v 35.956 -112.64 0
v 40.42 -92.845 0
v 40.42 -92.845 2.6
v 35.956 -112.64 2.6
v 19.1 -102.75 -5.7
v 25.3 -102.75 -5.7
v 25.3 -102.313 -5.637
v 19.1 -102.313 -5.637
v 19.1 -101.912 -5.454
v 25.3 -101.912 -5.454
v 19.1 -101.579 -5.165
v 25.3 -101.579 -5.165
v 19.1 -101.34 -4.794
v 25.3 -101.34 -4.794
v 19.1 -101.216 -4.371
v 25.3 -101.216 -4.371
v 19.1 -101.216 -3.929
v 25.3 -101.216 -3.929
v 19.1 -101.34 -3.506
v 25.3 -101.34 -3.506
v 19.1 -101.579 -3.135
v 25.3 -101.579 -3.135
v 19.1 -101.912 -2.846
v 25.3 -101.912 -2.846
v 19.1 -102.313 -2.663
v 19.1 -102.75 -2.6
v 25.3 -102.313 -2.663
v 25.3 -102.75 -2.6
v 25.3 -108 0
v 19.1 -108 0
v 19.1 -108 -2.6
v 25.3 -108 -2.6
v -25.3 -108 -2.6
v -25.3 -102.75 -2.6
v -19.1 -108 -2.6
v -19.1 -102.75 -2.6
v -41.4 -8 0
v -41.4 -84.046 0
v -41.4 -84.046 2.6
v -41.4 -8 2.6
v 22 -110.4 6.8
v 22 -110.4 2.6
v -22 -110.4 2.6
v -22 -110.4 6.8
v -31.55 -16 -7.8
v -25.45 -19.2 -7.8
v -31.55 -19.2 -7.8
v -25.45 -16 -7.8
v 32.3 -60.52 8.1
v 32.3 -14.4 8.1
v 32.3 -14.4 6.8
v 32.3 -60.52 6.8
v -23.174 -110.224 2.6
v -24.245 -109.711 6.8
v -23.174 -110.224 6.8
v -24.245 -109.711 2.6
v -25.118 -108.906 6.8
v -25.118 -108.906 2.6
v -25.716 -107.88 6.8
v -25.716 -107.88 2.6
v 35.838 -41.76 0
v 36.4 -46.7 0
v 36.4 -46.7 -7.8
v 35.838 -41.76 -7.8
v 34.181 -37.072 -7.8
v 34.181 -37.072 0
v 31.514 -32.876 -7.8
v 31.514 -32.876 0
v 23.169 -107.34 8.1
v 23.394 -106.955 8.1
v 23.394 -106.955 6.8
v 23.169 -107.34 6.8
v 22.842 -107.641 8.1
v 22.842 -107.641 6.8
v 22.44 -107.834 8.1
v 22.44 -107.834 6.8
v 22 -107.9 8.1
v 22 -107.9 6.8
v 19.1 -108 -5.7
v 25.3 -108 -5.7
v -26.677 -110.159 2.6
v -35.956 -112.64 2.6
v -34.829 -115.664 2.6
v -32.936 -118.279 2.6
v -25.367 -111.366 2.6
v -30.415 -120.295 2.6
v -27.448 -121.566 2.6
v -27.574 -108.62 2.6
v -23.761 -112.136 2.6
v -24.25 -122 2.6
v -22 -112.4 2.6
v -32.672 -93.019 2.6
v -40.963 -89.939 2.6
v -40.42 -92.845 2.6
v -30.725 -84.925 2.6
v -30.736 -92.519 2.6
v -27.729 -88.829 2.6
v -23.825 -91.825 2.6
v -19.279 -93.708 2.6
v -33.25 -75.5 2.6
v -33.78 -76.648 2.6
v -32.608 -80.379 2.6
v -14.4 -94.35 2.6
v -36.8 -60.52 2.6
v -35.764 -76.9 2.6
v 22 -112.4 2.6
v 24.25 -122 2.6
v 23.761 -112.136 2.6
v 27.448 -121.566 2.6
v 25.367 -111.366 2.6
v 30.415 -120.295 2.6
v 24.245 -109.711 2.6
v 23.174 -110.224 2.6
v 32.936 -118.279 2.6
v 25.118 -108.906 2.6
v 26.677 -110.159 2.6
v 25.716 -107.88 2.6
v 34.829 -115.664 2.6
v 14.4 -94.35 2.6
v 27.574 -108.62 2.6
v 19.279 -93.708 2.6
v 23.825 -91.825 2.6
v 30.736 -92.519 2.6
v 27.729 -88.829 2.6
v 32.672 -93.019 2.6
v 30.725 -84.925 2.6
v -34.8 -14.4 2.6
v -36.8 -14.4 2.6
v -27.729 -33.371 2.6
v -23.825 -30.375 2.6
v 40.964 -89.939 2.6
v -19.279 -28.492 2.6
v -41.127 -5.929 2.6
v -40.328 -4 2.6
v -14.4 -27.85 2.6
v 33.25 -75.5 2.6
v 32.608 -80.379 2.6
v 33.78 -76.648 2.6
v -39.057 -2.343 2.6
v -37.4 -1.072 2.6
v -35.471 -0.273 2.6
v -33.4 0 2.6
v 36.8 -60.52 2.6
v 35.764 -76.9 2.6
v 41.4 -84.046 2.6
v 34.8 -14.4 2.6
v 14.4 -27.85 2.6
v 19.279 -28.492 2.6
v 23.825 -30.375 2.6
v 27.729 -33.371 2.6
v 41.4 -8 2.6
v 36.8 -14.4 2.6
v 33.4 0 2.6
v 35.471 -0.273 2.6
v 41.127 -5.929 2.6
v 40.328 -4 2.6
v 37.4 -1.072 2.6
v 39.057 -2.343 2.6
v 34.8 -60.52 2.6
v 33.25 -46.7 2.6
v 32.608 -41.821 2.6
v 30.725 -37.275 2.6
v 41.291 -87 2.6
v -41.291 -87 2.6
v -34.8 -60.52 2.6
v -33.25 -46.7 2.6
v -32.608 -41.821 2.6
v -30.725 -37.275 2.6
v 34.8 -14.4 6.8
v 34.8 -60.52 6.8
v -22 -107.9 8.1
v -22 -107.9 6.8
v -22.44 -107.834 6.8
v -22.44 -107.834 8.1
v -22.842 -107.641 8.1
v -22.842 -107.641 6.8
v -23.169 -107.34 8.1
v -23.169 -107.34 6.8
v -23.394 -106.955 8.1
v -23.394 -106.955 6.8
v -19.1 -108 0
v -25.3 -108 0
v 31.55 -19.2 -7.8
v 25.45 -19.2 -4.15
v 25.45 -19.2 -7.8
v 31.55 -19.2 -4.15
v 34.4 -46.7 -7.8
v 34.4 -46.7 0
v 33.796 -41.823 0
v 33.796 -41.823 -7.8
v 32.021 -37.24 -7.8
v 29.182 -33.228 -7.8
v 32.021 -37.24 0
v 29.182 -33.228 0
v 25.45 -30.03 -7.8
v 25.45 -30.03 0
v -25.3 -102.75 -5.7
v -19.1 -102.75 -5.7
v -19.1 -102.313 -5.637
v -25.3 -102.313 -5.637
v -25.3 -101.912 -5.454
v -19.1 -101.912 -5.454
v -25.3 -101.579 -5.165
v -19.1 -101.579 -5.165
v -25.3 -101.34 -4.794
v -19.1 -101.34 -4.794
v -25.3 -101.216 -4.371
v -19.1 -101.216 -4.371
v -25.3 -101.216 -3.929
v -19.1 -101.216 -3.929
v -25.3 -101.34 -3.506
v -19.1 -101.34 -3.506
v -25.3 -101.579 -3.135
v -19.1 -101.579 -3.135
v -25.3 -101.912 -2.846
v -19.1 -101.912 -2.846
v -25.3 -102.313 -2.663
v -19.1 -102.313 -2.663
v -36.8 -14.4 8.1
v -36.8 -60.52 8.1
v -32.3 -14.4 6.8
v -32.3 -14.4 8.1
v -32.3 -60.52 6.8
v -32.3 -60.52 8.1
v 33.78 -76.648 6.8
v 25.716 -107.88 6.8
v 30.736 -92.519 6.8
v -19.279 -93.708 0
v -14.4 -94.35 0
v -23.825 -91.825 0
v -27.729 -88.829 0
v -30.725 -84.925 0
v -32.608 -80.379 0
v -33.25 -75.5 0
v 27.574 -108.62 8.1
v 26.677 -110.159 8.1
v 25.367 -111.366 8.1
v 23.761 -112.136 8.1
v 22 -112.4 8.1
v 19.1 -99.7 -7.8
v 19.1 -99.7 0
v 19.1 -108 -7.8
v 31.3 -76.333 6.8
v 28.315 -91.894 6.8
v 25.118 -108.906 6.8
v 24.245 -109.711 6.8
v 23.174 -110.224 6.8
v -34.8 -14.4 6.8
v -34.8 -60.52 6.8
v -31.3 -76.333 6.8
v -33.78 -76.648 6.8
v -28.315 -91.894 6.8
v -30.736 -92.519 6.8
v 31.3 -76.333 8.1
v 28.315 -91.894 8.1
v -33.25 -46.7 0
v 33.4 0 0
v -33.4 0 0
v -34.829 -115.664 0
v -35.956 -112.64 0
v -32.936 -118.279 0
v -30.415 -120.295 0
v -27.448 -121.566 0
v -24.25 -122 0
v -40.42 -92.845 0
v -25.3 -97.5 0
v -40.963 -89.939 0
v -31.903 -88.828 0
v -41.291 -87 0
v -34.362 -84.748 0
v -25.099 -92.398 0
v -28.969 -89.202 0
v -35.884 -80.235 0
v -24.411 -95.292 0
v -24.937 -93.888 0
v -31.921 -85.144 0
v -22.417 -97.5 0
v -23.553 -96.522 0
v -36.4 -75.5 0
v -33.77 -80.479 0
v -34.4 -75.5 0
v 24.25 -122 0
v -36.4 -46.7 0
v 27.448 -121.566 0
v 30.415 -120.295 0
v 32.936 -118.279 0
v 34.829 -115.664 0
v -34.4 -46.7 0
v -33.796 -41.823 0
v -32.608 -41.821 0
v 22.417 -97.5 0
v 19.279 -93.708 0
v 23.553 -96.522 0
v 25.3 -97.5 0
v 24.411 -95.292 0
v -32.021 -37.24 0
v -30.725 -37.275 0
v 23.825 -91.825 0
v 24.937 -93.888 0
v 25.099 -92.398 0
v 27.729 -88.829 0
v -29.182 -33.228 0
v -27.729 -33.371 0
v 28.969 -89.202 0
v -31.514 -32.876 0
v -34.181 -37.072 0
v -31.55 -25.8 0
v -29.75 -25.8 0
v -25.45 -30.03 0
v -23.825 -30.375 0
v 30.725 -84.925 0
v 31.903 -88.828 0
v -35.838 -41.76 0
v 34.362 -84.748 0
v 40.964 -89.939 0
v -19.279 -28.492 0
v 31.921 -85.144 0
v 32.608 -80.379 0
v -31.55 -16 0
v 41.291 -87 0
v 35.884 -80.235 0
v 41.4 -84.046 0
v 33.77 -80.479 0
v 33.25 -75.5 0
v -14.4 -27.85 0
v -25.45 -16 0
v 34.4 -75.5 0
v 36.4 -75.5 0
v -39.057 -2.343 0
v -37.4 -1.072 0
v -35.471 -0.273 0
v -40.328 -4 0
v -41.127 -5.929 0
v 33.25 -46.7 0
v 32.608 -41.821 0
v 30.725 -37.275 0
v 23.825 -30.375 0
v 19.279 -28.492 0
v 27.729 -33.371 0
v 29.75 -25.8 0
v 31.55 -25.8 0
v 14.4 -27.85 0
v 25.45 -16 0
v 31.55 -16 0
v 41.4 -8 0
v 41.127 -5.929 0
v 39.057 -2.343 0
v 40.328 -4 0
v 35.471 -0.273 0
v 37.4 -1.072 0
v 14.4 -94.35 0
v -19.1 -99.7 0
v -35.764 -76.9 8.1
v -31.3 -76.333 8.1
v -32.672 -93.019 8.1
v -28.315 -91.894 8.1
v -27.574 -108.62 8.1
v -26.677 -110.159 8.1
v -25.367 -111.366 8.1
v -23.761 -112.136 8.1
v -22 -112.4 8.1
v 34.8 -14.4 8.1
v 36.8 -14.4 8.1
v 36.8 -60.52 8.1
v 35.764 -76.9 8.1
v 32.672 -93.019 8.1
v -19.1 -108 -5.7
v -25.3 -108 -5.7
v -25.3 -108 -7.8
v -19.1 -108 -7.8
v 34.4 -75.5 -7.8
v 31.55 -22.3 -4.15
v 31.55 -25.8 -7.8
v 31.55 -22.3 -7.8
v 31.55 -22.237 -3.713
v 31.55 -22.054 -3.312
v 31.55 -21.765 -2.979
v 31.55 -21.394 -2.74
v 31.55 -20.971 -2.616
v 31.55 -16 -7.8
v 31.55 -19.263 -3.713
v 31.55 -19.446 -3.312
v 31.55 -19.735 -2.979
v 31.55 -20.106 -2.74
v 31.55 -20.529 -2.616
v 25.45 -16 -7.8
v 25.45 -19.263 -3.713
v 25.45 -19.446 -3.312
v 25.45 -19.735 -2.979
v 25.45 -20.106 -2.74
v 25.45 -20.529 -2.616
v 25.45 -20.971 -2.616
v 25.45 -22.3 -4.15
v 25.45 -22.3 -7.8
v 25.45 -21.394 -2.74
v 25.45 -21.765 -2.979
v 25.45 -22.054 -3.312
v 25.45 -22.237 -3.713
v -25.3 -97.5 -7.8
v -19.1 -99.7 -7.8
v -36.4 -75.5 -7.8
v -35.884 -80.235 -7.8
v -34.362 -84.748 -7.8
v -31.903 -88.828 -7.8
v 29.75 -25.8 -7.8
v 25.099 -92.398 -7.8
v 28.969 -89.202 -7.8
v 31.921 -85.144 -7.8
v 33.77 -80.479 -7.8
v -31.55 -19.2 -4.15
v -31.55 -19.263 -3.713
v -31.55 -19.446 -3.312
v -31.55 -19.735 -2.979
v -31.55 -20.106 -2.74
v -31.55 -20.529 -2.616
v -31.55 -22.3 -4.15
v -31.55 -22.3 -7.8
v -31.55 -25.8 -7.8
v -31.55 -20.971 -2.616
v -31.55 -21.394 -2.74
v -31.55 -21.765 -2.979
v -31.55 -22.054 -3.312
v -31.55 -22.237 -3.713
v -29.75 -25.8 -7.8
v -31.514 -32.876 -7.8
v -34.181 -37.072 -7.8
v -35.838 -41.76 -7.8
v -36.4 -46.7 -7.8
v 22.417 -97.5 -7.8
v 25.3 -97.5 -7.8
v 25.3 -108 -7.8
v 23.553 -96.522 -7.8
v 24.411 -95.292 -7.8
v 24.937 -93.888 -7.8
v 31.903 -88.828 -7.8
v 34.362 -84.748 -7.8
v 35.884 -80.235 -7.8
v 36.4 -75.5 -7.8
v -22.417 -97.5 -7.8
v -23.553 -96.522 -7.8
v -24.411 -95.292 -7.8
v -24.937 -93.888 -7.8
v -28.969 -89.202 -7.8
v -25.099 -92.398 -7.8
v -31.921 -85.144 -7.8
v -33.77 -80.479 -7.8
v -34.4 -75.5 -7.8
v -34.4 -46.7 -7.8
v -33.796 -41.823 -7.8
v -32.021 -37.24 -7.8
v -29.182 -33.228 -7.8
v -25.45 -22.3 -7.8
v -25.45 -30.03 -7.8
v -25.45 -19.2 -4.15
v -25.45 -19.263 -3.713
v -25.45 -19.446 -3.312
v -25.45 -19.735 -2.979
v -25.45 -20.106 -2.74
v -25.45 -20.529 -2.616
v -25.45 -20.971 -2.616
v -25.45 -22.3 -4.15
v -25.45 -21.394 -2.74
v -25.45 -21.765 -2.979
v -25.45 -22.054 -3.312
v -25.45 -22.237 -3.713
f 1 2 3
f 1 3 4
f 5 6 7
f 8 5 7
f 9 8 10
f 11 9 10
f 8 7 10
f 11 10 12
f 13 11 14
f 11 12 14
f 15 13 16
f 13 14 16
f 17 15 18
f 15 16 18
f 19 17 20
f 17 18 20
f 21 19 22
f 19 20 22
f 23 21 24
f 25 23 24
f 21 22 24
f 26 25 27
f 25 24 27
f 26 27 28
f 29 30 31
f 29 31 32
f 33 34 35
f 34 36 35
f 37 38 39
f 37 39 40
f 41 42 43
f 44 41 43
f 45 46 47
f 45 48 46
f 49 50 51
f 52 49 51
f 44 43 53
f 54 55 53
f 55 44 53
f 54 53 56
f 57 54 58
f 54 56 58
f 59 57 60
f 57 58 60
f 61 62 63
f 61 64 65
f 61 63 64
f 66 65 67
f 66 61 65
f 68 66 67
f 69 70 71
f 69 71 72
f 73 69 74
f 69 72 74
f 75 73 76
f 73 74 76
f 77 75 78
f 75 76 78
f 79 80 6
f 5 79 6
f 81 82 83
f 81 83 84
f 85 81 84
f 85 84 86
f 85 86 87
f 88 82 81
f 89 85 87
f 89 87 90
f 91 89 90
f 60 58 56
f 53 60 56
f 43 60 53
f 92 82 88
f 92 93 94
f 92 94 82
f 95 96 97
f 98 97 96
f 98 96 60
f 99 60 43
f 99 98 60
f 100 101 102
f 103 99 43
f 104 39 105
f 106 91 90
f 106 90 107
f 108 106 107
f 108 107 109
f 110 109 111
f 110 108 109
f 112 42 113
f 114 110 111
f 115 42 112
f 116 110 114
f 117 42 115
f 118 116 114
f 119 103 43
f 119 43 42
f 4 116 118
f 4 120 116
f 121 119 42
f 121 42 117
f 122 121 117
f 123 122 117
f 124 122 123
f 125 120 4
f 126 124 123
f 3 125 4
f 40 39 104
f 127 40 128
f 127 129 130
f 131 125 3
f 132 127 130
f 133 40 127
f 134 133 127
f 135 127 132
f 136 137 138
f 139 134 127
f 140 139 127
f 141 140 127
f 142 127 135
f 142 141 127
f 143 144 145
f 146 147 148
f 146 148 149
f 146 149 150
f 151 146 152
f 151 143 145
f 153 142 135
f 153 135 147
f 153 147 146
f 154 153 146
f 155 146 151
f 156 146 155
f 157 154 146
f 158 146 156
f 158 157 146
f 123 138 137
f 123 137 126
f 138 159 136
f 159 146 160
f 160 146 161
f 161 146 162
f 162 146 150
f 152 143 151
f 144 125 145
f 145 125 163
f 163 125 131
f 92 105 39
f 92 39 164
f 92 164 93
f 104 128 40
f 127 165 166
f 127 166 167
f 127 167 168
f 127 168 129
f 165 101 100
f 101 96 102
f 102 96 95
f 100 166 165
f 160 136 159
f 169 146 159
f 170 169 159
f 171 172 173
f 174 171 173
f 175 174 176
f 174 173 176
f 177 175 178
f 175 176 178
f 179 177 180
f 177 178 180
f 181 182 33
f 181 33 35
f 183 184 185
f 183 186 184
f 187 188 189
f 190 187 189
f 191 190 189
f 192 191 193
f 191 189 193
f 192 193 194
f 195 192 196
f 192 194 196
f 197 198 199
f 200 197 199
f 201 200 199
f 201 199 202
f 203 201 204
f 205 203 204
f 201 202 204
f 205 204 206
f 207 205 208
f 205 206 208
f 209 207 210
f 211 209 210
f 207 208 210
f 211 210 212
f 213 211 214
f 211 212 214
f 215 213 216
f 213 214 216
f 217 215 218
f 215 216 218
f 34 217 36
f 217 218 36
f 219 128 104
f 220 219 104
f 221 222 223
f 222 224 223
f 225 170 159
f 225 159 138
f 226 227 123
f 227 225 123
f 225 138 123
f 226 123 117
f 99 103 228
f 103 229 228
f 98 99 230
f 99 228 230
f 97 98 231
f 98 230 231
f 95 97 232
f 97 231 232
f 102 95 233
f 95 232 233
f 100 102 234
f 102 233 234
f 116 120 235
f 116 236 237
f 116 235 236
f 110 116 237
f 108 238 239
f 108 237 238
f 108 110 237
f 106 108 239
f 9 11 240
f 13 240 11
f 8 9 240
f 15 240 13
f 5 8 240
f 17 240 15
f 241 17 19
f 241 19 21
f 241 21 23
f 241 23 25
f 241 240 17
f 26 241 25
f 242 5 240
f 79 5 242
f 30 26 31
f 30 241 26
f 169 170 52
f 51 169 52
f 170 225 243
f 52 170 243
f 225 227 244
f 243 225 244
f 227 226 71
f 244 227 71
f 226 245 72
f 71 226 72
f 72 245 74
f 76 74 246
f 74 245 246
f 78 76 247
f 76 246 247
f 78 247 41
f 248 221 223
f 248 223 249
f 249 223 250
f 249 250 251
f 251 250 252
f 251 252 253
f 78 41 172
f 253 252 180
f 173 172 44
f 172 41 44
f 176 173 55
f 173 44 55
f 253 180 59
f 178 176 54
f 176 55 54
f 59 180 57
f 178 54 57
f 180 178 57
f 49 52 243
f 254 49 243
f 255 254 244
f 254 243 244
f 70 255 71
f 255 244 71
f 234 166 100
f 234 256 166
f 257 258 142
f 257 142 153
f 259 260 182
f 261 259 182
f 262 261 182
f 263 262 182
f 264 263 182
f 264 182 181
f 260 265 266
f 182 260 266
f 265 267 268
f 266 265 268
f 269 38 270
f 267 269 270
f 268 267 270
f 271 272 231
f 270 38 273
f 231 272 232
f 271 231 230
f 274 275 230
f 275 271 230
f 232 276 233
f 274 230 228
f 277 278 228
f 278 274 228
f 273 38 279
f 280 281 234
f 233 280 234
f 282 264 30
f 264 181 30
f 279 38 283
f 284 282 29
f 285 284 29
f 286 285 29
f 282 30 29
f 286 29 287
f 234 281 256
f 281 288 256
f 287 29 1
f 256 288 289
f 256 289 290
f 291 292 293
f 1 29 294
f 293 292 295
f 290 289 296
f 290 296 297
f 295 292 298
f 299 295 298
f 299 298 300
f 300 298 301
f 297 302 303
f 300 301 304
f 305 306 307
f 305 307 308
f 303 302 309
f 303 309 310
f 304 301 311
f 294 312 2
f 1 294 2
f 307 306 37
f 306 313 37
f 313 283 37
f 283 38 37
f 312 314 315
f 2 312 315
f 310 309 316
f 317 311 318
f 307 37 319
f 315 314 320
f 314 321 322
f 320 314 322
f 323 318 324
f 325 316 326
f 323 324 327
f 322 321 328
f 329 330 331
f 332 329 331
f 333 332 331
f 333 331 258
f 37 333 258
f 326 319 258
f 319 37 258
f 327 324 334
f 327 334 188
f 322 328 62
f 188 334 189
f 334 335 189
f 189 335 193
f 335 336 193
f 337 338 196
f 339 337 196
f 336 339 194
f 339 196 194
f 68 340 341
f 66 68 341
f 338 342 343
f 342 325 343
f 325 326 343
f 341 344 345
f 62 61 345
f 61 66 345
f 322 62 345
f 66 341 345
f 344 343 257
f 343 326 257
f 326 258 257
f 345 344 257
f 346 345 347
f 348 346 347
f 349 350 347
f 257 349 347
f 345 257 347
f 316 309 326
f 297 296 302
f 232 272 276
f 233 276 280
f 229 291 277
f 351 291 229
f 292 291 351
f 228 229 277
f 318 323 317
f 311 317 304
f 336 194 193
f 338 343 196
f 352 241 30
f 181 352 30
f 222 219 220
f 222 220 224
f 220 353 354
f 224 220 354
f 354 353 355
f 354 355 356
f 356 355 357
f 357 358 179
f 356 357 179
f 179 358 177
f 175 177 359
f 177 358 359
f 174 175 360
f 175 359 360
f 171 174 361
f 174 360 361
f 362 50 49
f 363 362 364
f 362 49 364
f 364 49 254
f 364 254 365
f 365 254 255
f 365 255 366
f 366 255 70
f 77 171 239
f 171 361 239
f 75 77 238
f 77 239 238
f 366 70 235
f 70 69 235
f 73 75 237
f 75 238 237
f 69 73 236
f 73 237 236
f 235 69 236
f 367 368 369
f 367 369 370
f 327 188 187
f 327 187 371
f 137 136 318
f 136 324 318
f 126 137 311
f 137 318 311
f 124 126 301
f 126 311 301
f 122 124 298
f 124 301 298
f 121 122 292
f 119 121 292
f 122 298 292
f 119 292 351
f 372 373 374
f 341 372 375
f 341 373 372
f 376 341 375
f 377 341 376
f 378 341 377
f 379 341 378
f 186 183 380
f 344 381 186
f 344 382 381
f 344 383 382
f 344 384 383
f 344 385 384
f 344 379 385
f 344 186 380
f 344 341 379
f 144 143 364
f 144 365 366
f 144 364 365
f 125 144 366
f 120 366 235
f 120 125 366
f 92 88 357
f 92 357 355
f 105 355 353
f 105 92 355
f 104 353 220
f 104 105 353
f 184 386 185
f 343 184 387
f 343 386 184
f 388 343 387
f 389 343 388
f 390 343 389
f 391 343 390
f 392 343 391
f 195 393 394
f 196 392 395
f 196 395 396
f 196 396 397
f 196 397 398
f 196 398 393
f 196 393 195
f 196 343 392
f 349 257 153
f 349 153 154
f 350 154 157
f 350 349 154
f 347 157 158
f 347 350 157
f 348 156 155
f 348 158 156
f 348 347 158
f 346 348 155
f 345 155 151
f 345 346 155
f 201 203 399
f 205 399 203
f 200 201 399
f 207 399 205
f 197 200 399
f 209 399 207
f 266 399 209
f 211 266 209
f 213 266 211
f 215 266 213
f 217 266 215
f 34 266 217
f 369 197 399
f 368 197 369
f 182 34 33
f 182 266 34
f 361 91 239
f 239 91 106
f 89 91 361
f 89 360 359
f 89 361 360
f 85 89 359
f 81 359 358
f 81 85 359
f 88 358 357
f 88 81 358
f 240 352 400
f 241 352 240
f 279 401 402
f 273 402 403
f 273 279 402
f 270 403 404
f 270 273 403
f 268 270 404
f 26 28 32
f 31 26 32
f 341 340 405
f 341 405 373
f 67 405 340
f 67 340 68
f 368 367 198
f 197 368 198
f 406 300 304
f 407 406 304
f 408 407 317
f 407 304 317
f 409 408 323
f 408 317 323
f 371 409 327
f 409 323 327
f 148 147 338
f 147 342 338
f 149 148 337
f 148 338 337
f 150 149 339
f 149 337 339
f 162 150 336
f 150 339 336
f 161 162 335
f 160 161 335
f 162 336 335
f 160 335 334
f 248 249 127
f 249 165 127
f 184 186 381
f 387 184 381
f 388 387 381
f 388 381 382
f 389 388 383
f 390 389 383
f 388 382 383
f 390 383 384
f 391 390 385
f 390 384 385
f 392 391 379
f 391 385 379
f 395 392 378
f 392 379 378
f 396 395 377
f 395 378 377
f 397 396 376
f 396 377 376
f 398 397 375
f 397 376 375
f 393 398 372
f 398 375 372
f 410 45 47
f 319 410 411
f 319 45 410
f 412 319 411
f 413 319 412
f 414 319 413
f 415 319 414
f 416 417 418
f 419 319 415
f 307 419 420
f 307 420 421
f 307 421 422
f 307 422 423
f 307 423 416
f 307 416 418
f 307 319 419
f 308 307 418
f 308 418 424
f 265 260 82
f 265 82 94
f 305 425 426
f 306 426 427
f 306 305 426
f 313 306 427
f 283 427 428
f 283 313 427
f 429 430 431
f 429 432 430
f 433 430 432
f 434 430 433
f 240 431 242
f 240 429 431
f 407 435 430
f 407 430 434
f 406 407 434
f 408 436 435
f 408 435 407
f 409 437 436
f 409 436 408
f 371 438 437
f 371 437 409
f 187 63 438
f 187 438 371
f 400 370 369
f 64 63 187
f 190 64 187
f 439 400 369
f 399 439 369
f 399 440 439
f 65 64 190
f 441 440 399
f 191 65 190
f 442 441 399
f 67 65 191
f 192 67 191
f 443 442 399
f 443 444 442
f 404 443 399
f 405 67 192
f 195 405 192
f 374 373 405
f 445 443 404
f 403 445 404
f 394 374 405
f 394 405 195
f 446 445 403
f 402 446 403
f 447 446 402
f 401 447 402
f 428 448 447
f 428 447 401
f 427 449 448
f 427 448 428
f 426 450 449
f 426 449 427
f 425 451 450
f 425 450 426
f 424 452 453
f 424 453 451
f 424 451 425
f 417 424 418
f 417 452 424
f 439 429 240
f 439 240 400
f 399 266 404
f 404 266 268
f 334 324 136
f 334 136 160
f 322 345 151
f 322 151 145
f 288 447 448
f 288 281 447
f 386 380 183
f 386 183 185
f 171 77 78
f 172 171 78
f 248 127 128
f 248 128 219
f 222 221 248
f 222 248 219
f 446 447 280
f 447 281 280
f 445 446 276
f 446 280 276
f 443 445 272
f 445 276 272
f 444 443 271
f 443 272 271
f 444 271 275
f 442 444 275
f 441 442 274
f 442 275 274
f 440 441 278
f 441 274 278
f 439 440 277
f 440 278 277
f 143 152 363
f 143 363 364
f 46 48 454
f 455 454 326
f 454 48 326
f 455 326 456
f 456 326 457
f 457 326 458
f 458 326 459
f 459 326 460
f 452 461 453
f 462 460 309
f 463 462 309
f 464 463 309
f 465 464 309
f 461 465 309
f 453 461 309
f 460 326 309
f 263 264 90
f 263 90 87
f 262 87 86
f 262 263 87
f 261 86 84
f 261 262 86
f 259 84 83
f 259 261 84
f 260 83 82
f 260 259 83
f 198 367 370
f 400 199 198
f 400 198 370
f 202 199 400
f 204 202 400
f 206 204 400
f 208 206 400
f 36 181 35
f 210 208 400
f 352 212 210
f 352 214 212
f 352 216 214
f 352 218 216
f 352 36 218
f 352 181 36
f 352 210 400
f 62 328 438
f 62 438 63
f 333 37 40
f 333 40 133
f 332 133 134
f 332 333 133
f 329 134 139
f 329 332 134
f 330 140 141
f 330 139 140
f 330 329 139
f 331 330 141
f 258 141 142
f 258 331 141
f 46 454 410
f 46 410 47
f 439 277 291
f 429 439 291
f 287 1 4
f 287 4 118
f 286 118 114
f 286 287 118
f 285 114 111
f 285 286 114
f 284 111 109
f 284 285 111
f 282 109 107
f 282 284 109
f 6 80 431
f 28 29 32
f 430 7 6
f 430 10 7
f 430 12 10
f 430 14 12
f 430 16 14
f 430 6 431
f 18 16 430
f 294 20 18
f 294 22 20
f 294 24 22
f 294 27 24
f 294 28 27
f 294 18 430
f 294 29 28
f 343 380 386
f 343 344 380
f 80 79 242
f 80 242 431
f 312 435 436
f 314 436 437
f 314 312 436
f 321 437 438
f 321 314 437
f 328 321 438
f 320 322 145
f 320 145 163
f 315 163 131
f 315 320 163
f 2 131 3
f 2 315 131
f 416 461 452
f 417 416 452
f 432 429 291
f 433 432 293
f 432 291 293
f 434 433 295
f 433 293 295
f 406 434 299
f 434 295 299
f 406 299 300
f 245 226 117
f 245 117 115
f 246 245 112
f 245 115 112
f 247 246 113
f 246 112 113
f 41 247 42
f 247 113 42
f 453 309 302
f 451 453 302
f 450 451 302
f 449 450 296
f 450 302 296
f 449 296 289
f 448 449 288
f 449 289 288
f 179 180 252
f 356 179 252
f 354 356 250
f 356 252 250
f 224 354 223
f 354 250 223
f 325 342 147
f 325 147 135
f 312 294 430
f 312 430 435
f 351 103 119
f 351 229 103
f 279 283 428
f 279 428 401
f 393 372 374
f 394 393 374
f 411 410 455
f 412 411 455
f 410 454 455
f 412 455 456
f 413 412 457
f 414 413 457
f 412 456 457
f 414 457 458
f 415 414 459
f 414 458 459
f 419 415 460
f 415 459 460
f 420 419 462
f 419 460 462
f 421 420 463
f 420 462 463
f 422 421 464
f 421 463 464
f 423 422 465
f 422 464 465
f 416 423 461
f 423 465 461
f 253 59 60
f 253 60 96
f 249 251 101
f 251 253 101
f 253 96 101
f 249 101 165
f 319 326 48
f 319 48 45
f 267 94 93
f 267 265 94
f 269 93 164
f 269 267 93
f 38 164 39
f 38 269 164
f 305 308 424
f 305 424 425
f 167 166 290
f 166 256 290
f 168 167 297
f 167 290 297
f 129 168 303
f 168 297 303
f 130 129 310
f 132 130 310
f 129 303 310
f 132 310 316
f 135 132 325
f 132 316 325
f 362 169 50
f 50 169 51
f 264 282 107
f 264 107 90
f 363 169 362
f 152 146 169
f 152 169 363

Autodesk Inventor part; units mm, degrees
ref_plane "YZ Plane" through (0, 0, 0) normal (1, 0, 0) x (0, 1, 0)
ref_plane "XZ Plane" through (0, 0, 0) normal (0, 1, 0) x (-1, 0, 0)
ref_plane "XY Plane" through (0, 0, 0) normal (0, 0, 1) x (1, 0, 0)
sketch "Skizze1" plane through (0, 0, 0) normal (0, 0, 1) x (1, 0, 0)
  line L0 (-33.4, 0) -> (33.4, 0)
  line L1 (41.4, -8) -> (41.4, -84.0456)
  line L2 (40.4201, -92.8453) -> (35.956, -112.6399)
  line L3 (24.25, -122) -> (-24.25, -122)
  line L4 (-35.956, -112.6399) -> (-40.4201, -92.8453)
  line L5 (-41.4, -84.0456) -> (-41.4, -8)
  line L6 (0, 0) -> (0, -122) construction
  arc A0 (-41.4, -84.0456) -> (-40.4201, -92.8453) centre (-1.4, -84.0456) ccw
  arc A1 (40.4201, -92.8453) -> (41.4, -84.0456) centre (1.4, -84.0456) ccw
  arc A2 (-35.956, -112.6399) -> (-24.25, -122) centre (-24.25, -110) ccw
  arc A3 (24.25, -122) -> (35.956, -112.6399) centre (24.25, -110) ccw
  arc A4 (-33.4, 0) -> (-41.4, -8) centre (-33.4, -8) ccw
  arc A5 (41.4, -8) -> (33.4, 0) centre (33.4, -8) ccw
  point P0 (33.8452, -122)
  point P1 (-33.8452, -122)
  point P2 (-41.4, -88.5)
  dimension "d1" = 82.8
  dimension "d2" = 122
  dimension "d3" = 33.5
  dimension "d4" = 40
  dimension "d5" = 12
  dimension "d6" = 8
  dimension "d15" = 48.5
extrude "Extrusion1" add sketch "Skizze1" along normal blind 2.6
sketch "Skizze2" plane through (0, 0, 2.6) normal (0, 0, 1) x (1, 0, 0)
  line L0 (-36.8, -14.4) -> (-36.8, -60.5202)
  arc A0 (-36.8, -60.5202) -> (-27.5742, -108.62) centre (93.2, -60.5202) ccw
  line L1 (-22, -112.4) -> (22, -112.4)
  line L2 (36.8, -14.4) -> (36.8, -60.5202)
  arc A1 (27.5742, -108.62) -> (36.8, -60.5202) centre (-93.2, -60.5202) ccw
  line L3 (-36.8, -60.5202) -> (36.8, -60.5202) construction
  line L4 (-36.8, -14.4) -> (36.8, -14.4) construction
  line L5 (0, 0) -> (0, -122) construction
  line L6 (-24.25, -122) -> (24.25, -122) construction
  arc A2 (-27.5742, -108.62) -> (-22, -112.4) centre (-22, -106.4) ccw
  arc A3 (22, -112.4) -> (27.5742, -108.62) centre (22, -106.4) ccw
  line L7 (41.4, -84.0456) -> (41.4, -8) construction
  line L8 (-41.4, -8) -> (-41.4, -84.0456) construction
  line L9 (-34.8, -60.5202) -> (-34.8, -14.4)
  line L10 (34.8, -14.4) -> (34.8, -60.5202)
  arc A4 (25.7161, -107.88) -> (34.8, -60.5202) centre (-93.2, -60.5202) ccw
  arc A5 (22, -110.4) -> (25.7161, -107.88) centre (22, -106.4) ccw
  line L11 (22, -110.4) -> (-22, -110.4)
  arc A6 (-25.7161, -107.88) -> (-22, -110.4) centre (-22, -106.4) ccw
  arc A7 (-34.8, -60.5202) -> (-25.7161, -107.88) centre (93.2, -60.5202) ccw
  line L12 (-36.8, -14.4) -> (-34.8, -14.4)
  line L13 (34.8, -14.4) -> (36.8, -14.4)
  point P0 (-25.9993, -112.4)
  point P1 (25.9993, -112.4)
  point P2 (0, -14.4)
  dimension "d9" = 6
  dimension "d10" = 6
  dimension "d11" = 130
  dimension "d12" = 4.6
  dimension "d13" = 9.6
  dimension "d14" = 44
  dimension "d16" = 14.4
  dimension "d17" = 2
extrude "Extrusion2" add sketch "Skizze2" along normal blind 5.5
sketch "Skizze3" plane through (-36.8, -14.4, 2.6) normal (0, 1, 0) x (1, 0, 0)
  line L0 (2, -4.2) -> (4.5, -4.2)
  line L1 (4.5, -4.2) -> (4.5, -5.5)
  line L2 (4.5, -5.5) -> (2, -5.5)
  line L3 (2, -5.5) -> (2, -4.2)
  line L4 (0, 0) -> (0, -5.5) projected
  point P0 (36.8, 2.6)
  dimension "d20" = 4.5
  dimension "d21" = 1.3
sketch "Skizze4" plane through (0, 0, 8.1) normal (0, 0, 1) x (1, 0, 0)
  line L0 (-34.8, -60.5202) -> (-34.8, -14.4) projected
  arc A0 (-34.8, -60.5202) -> (-25.7161, -107.88) centre (93.2, -60.5202) ccw projected
  arc A1 (-25.7161, -107.88) -> (-22, -110.4) centre (-22, -106.4) ccw projected
  line L1 (22, -110.4) -> (-22, -110.4) projected
  arc A2 (22, -110.4) -> (25.7161, -107.88) centre (22, -106.4) ccw projected
  arc A3 (25.7161, -107.88) -> (34.8, -60.5202) centre (-93.2, -60.5202) ccw projected
  line L2 (34.8, -14.4) -> (34.8, -60.5202) projected
  point P0 (0, 0)
sketch3d "3D-Skizze1"
  line L0 (-34.8, -14.4, 8.1) -> (-34.8, -60.5202, 8.1)
  arc A0 (-34.8, -60.5202, 8.1) -> (-25.7161, -107.88, 8.1) centre (93.2, -60.5202, 8.1) ccw
  arc A1 (-25.7161, -107.88, 8.1) -> (-22, -110.4, 8.1) centre (-22, -106.4, 8.1) ccw
  line L1 (-22, -110.4, 8.1) -> (22, -110.4, 8.1)
  arc A2 (22, -110.4, 8.1) -> (25.7161, -107.88, 8.1) centre (22, -106.4, 8.1) ccw
  arc A3 (25.7161, -107.88, 8.1) -> (34.8, -60.5202, 8.1) centre (-93.2, -60.5202, 8.1) ccw
  line L2 (34.8, -60.5202, 8.1) -> (34.8, -14.4, 8.1)
sweep "Sweeping1" add profiles "Skizze3" path "3D-Skizze1"
sketch "Skizze5" plane through (0, 0, 0) normal (0, 0, -1) x (-1, 0, 0)
  line L0 (-36.4, -24.7) -> (36.4, -24.7)
  line L1 (36.4, -24.7) -> (36.4, -97.5)
  line L2 (36.4, -97.5) -> (-36.4, -97.5)
  line L3 (-36.4, -97.5) -> (-36.4, -24.7)
  line L4 (-36.4, -24.7) -> (36.4, -97.5) construction
  line L5 (36.4, -24.7) -> (-36.4, -97.5) construction
  circle A0 centre (14.4, -46.7) radius 22 construction
  line L6 (0, 0) -> (0, -122) construction
  line L7 (24.25, -122) -> (-24.25, -122) construction
  line L8 (34.4, -26.7) -> (-34.4, -26.7)
  line L9 (-34.4, -26.7) -> (-34.4, -95.5)
  line L10 (-34.4, -95.5) -> (34.4, -95.5)
  line L11 (34.4, -95.5) -> (34.4, -26.7)
  line L12 (34.4, -26.7) -> (-34.4, -95.5) construction
  line L13 (-34.4, -26.7) -> (34.4, -95.5) construction
  circle A1 centre (-14.4, -46.7) radius 22 construction
  circle A2 centre (-14.4, -75.5) radius 22 construction
  circle A3 centre (14.4, -75.5) radius 22 construction
  line L14 (41.4, -8) -> (41.4, -84.0456) construction
  arc A4 (-36.4, -75.5) -> (-14.4, -97.5) centre (-14.4, -75.5) ccw
  arc A5 (-14.4, -24.7) -> (-36.4, -46.7) centre (-14.4, -46.7) ccw
  arc A6 (36.4, -46.7) -> (14.4, -24.7) centre (14.4, -46.7) ccw
  arc A7 (14.4, -97.5) -> (36.4, -75.5) centre (14.4, -75.5) ccw
  line L15 (-25.3, -97.5) -> (-19.1, -97.5)
  line L16 (-19.1, -97.5) -> (-19.1, -108)
  line L17 (-19.1, -108) -> (-25.3, -108)
  line L18 (-25.3, -108) -> (-25.3, -97.5)
  line L19 (19.1, -97.5) -> (25.3, -97.5)
  line L20 (25.3, -97.5) -> (25.3, -108)
  line L21 (25.3, -108) -> (19.1, -108)
  line L22 (19.1, -108) -> (19.1, -97.5)
  line L23 (-19.1, -108) -> (19.1, -108) construction
  arc A8 (-14.4, -26.7) -> (-34.4, -46.7) centre (-14.4, -46.7) ccw
  arc A9 (34.4, -46.7) -> (14.4, -26.7) centre (14.4, -46.7) ccw
  arc A10 (14.4, -95.5) -> (34.4, -75.5) centre (14.4, -75.5) ccw
  arc A11 (-34.4, -75.5) -> (-14.4, -95.5) centre (-14.4, -75.5) ccw
  line L24 (-25.3, -97.5) -> (-31.9034, -88.8279)
  line L25 (25.3, -97.5) -> (31.9034, -88.8279)
  line L26 (-19.1, -98.5) -> (19.1, -98.5)
  line L27 (19.1, -98.5) -> (19.1, -99.7)
  line L28 (19.1, -99.7) -> (-19.1, -99.7)
  line L29 (-19.1, -99.7) -> (-19.1, -98.5)
  arc A12 (-25.0991, -92.3976) -> (-19.1, -98.5) centre (-19.1, -92.5) ccw
  arc A13 (19.1, -98.5) -> (25.0991, -92.3976) centre (19.1, -92.5) ccw
  line L30 (-31.55, -16) -> (-25.45, -16)
  line L31 (-25.45, -16) -> (-25.45, -25.8)
  line L32 (-25.45, -25.8) -> (-31.55, -25.8)
  line L33 (-31.55, -25.8) -> (-31.55, -16)
  line L34 (25.45, -16) -> (31.55, -16)
  line L35 (31.55, -16) -> (31.55, -25.8)
  line L36 (31.55, -25.8) -> (25.45, -25.8)
  line L37 (25.45, -25.8) -> (25.45, -16)
  line L38 (-25.45, -16) -> (25.45, -16) construction
  line L39 (-29.75, -25.8) -> (-31.5142, -32.876)
  line L40 (29.75, -25.8) -> (31.5142, -32.876)
  line L41 (-29.75, -25.8) -> (-29.75, -30.94) construction
  line L42 (29.75, -25.8) -> (29.75, -30.94) construction
  line L43 (-25.45, -25.8) -> (-25.45, -30.0297)
  line L44 (25.45, -25.8) -> (25.45, -30.0297)
  line L45 (-33.25, -27.85) -> (33.25, -27.85)
  line L46 (33.25, -27.85) -> (33.25, -94.35)
  line L47 (33.25, -94.35) -> (-33.25, -94.35)
  line L48 (-33.25, -94.35) -> (-33.25, -27.85)
  line L49 (-33.25, -27.85) -> (33.25, -94.35) construction
  line L50 (33.25, -27.85) -> (-33.25, -94.35) construction
  circle A14 centre (-14.4, -75.5) radius 18.85
  circle A15 centre (-14.4, -46.7) radius 18.85
  circle A16 centre (14.4, -46.7) radius 18.85
  circle A17 centre (14.4, -75.5) radius 18.85
  point P0 (0, -61.1)
  point P1 (0, -24.7)
  point P2 (0, -108)
  point P3 (0, -16)
  point P4 (34.4, -46.7)
  point P5 (34.4, -75.5)
  point P6 (22.4166, -97.5)
  point P7 (-22.4166, -97.5)
  point P8 (-34.4, -75.5)
  point P9 (-34.4, -46.7)
  point P10 (-33.25, -40.0159)
  point P11 (-33.25, -82.1841)
  point P12 (-21.0841, -94.35)
  point P13 (21.0841, -94.35)
  point P14 (33.25, -82.1841)
  point P15 (33.25, -40.0159)
  point P16 (21.0841, -27.85)
  point P17 (-21.0841, -27.85)
  point P18 (14.4, -27.85)
  point P19 (-14.4, -27.85)
  point P20 (-33.25, -46.7)
  point P21 (-33.25, -75.5)
  point P22 (-14.4, -94.35)
  point P23 (14.4, -94.35)
  point P24 (33.25, -75.5)
  point P25 (33.25, -46.7)
  dimension "d25" = 2
  dimension "d26" = 22
  dimension "d27" = 5
  dimension "d29" = 6.2
  dimension "d30" = 6.2
  dimension "d31" = 38.2
  dimension "d33" = 1.2
  dimension "d34" = 3
  dimension "d35" = 6
  dimension "d36" = 6
  dimension "d37" = 63.1
  dimension "d38" = 6.1
  dimension "d39" = 6.1
  dimension "d40" = 92
  dimension "d41" = 9.8
  dimension "d42" = 37.287
  dimension "d44" = 1.8
  dimension "d45" = 1.8
  dimension "d46" = 14
  dimension "d79" = 66.5
  dimension "d80" = 66.5
  dimension "d83" = 22.3
  dimension "d84" = 14
extrude "Extrusion3" add sketch "Skizze5" along normal blind 7.8 contours L31 L32 L33 L0 | L0 L33 L30 L31 | L37 L34 L35 L0 | L0 L35 L36 L37 | L43 L8 L39 L32 | L43 A5 L45 L39 L8 | L43 L45 A5 | L36 L40 L8 L44 | L8 L40 L45 A6 L44 | A6 L45 L44 | L45 L43 A8 L48 A5 | A5 L39 L45 | L45 L40 A6 | A6 L46 A9 L44 L45 | A5 L9 A4 L3 | L1 A7 L11 A6 | A5 L48 A8 L9 | L11 A9 L46 A6 | L9 A11 L48 A4 | A7 L46 A10 L11 | L24 L10 A12 L2 | L2 A12 L16 L17 L18 | L48 A11 A12 L47 A4 | L20 L21 L22 A13 L2 | L2 A13 L10 L25 | A7 L47 A13 A10 L46 | L2 L16 A12 | L24 L47 A4 A12 L10 | A4 L47 L24 | A13 L22 L2 | L10 A13 A7 L47 L25 | L25 L47 A7 | L2 L22 L26 L16 | L26 L22 L28 L16 | L47 A12 A4 | A7 A13 L47
sketch "Skizze6" plane through (31.55, -25.8, 0) normal (1, 0, 0) x (0, 0, -1)
  line L0 (0, 0) -> (7.8, 0) construction
  circle A0 centre (4.15, 5.05) radius 1.55
  line L1 (7.8, 9.8) -> (7.8, 0) projected
  line L2 (4.15, 3.5) -> (7.8, 3.5)
  line L3 (4.15, 6.6) -> (7.8, 6.6)
  line L4 (2.6, 5.05) -> (2.6, 0) construction
  circle A1 centre (4.15, -76.95) radius 1.55
  line L5 (2.6, -76.95) -> (2.6, -82.2)
  line L6 (0, -82.2) -> (7.8, -82.2) construction
  line L7 (2.6, -82.2) -> (5.7, -82.2)
  line L8 (5.7, -82.2) -> (5.7, -76.95)
  line L9 (4.15, -75.4) -> (7.8, -75.4) construction
  line L10 (7.8, -71.7) -> (7.8, -82.2) construction
  line L11 (4.15, -82.2) -> (4.15, -76.95) construction
  line L12 (7.8, -20.9) -> (7.8, -49.7) construction
  line L13 (4.15, 5.05) -> (4.15, -76.95) construction
  point P0 (0, 25.8)
  dimension "d49" = 3.1
  dimension "d50" = 3.5
  dimension "d76" = 6.8
  dimension "d77" = 3.1
  dimension "d78" = 5.2
extrude "Extrusion4" cut sketch "Skizze6" against normal through all
ref_plane "Arbeitsebene1" through (0, -75.5, 0) normal (1, 0, 0) x (0, 0, -1)
extrude "Extrusion5" cut sketch "Skizze5" against normal up to surface (2.6 mm away) contours L45 A16 A15 | A15 A16 A14 | A16 A17 A15 | A15 A16 | A15 A14 L48 | L46 A17 A16 | A16 A17 A14 A15 | A14 A15 A17 | A14 A15 | A17 A14 A16 | A16 A17 | A14 A17 L47 | A14 A17
equation "\"d9\" = d10"
equation "\"d30\" = d29"
equation "\"d36\" = d35"
properties part number "daVinciTool_Aufnahme" material "PMMA-Kunststoff"
